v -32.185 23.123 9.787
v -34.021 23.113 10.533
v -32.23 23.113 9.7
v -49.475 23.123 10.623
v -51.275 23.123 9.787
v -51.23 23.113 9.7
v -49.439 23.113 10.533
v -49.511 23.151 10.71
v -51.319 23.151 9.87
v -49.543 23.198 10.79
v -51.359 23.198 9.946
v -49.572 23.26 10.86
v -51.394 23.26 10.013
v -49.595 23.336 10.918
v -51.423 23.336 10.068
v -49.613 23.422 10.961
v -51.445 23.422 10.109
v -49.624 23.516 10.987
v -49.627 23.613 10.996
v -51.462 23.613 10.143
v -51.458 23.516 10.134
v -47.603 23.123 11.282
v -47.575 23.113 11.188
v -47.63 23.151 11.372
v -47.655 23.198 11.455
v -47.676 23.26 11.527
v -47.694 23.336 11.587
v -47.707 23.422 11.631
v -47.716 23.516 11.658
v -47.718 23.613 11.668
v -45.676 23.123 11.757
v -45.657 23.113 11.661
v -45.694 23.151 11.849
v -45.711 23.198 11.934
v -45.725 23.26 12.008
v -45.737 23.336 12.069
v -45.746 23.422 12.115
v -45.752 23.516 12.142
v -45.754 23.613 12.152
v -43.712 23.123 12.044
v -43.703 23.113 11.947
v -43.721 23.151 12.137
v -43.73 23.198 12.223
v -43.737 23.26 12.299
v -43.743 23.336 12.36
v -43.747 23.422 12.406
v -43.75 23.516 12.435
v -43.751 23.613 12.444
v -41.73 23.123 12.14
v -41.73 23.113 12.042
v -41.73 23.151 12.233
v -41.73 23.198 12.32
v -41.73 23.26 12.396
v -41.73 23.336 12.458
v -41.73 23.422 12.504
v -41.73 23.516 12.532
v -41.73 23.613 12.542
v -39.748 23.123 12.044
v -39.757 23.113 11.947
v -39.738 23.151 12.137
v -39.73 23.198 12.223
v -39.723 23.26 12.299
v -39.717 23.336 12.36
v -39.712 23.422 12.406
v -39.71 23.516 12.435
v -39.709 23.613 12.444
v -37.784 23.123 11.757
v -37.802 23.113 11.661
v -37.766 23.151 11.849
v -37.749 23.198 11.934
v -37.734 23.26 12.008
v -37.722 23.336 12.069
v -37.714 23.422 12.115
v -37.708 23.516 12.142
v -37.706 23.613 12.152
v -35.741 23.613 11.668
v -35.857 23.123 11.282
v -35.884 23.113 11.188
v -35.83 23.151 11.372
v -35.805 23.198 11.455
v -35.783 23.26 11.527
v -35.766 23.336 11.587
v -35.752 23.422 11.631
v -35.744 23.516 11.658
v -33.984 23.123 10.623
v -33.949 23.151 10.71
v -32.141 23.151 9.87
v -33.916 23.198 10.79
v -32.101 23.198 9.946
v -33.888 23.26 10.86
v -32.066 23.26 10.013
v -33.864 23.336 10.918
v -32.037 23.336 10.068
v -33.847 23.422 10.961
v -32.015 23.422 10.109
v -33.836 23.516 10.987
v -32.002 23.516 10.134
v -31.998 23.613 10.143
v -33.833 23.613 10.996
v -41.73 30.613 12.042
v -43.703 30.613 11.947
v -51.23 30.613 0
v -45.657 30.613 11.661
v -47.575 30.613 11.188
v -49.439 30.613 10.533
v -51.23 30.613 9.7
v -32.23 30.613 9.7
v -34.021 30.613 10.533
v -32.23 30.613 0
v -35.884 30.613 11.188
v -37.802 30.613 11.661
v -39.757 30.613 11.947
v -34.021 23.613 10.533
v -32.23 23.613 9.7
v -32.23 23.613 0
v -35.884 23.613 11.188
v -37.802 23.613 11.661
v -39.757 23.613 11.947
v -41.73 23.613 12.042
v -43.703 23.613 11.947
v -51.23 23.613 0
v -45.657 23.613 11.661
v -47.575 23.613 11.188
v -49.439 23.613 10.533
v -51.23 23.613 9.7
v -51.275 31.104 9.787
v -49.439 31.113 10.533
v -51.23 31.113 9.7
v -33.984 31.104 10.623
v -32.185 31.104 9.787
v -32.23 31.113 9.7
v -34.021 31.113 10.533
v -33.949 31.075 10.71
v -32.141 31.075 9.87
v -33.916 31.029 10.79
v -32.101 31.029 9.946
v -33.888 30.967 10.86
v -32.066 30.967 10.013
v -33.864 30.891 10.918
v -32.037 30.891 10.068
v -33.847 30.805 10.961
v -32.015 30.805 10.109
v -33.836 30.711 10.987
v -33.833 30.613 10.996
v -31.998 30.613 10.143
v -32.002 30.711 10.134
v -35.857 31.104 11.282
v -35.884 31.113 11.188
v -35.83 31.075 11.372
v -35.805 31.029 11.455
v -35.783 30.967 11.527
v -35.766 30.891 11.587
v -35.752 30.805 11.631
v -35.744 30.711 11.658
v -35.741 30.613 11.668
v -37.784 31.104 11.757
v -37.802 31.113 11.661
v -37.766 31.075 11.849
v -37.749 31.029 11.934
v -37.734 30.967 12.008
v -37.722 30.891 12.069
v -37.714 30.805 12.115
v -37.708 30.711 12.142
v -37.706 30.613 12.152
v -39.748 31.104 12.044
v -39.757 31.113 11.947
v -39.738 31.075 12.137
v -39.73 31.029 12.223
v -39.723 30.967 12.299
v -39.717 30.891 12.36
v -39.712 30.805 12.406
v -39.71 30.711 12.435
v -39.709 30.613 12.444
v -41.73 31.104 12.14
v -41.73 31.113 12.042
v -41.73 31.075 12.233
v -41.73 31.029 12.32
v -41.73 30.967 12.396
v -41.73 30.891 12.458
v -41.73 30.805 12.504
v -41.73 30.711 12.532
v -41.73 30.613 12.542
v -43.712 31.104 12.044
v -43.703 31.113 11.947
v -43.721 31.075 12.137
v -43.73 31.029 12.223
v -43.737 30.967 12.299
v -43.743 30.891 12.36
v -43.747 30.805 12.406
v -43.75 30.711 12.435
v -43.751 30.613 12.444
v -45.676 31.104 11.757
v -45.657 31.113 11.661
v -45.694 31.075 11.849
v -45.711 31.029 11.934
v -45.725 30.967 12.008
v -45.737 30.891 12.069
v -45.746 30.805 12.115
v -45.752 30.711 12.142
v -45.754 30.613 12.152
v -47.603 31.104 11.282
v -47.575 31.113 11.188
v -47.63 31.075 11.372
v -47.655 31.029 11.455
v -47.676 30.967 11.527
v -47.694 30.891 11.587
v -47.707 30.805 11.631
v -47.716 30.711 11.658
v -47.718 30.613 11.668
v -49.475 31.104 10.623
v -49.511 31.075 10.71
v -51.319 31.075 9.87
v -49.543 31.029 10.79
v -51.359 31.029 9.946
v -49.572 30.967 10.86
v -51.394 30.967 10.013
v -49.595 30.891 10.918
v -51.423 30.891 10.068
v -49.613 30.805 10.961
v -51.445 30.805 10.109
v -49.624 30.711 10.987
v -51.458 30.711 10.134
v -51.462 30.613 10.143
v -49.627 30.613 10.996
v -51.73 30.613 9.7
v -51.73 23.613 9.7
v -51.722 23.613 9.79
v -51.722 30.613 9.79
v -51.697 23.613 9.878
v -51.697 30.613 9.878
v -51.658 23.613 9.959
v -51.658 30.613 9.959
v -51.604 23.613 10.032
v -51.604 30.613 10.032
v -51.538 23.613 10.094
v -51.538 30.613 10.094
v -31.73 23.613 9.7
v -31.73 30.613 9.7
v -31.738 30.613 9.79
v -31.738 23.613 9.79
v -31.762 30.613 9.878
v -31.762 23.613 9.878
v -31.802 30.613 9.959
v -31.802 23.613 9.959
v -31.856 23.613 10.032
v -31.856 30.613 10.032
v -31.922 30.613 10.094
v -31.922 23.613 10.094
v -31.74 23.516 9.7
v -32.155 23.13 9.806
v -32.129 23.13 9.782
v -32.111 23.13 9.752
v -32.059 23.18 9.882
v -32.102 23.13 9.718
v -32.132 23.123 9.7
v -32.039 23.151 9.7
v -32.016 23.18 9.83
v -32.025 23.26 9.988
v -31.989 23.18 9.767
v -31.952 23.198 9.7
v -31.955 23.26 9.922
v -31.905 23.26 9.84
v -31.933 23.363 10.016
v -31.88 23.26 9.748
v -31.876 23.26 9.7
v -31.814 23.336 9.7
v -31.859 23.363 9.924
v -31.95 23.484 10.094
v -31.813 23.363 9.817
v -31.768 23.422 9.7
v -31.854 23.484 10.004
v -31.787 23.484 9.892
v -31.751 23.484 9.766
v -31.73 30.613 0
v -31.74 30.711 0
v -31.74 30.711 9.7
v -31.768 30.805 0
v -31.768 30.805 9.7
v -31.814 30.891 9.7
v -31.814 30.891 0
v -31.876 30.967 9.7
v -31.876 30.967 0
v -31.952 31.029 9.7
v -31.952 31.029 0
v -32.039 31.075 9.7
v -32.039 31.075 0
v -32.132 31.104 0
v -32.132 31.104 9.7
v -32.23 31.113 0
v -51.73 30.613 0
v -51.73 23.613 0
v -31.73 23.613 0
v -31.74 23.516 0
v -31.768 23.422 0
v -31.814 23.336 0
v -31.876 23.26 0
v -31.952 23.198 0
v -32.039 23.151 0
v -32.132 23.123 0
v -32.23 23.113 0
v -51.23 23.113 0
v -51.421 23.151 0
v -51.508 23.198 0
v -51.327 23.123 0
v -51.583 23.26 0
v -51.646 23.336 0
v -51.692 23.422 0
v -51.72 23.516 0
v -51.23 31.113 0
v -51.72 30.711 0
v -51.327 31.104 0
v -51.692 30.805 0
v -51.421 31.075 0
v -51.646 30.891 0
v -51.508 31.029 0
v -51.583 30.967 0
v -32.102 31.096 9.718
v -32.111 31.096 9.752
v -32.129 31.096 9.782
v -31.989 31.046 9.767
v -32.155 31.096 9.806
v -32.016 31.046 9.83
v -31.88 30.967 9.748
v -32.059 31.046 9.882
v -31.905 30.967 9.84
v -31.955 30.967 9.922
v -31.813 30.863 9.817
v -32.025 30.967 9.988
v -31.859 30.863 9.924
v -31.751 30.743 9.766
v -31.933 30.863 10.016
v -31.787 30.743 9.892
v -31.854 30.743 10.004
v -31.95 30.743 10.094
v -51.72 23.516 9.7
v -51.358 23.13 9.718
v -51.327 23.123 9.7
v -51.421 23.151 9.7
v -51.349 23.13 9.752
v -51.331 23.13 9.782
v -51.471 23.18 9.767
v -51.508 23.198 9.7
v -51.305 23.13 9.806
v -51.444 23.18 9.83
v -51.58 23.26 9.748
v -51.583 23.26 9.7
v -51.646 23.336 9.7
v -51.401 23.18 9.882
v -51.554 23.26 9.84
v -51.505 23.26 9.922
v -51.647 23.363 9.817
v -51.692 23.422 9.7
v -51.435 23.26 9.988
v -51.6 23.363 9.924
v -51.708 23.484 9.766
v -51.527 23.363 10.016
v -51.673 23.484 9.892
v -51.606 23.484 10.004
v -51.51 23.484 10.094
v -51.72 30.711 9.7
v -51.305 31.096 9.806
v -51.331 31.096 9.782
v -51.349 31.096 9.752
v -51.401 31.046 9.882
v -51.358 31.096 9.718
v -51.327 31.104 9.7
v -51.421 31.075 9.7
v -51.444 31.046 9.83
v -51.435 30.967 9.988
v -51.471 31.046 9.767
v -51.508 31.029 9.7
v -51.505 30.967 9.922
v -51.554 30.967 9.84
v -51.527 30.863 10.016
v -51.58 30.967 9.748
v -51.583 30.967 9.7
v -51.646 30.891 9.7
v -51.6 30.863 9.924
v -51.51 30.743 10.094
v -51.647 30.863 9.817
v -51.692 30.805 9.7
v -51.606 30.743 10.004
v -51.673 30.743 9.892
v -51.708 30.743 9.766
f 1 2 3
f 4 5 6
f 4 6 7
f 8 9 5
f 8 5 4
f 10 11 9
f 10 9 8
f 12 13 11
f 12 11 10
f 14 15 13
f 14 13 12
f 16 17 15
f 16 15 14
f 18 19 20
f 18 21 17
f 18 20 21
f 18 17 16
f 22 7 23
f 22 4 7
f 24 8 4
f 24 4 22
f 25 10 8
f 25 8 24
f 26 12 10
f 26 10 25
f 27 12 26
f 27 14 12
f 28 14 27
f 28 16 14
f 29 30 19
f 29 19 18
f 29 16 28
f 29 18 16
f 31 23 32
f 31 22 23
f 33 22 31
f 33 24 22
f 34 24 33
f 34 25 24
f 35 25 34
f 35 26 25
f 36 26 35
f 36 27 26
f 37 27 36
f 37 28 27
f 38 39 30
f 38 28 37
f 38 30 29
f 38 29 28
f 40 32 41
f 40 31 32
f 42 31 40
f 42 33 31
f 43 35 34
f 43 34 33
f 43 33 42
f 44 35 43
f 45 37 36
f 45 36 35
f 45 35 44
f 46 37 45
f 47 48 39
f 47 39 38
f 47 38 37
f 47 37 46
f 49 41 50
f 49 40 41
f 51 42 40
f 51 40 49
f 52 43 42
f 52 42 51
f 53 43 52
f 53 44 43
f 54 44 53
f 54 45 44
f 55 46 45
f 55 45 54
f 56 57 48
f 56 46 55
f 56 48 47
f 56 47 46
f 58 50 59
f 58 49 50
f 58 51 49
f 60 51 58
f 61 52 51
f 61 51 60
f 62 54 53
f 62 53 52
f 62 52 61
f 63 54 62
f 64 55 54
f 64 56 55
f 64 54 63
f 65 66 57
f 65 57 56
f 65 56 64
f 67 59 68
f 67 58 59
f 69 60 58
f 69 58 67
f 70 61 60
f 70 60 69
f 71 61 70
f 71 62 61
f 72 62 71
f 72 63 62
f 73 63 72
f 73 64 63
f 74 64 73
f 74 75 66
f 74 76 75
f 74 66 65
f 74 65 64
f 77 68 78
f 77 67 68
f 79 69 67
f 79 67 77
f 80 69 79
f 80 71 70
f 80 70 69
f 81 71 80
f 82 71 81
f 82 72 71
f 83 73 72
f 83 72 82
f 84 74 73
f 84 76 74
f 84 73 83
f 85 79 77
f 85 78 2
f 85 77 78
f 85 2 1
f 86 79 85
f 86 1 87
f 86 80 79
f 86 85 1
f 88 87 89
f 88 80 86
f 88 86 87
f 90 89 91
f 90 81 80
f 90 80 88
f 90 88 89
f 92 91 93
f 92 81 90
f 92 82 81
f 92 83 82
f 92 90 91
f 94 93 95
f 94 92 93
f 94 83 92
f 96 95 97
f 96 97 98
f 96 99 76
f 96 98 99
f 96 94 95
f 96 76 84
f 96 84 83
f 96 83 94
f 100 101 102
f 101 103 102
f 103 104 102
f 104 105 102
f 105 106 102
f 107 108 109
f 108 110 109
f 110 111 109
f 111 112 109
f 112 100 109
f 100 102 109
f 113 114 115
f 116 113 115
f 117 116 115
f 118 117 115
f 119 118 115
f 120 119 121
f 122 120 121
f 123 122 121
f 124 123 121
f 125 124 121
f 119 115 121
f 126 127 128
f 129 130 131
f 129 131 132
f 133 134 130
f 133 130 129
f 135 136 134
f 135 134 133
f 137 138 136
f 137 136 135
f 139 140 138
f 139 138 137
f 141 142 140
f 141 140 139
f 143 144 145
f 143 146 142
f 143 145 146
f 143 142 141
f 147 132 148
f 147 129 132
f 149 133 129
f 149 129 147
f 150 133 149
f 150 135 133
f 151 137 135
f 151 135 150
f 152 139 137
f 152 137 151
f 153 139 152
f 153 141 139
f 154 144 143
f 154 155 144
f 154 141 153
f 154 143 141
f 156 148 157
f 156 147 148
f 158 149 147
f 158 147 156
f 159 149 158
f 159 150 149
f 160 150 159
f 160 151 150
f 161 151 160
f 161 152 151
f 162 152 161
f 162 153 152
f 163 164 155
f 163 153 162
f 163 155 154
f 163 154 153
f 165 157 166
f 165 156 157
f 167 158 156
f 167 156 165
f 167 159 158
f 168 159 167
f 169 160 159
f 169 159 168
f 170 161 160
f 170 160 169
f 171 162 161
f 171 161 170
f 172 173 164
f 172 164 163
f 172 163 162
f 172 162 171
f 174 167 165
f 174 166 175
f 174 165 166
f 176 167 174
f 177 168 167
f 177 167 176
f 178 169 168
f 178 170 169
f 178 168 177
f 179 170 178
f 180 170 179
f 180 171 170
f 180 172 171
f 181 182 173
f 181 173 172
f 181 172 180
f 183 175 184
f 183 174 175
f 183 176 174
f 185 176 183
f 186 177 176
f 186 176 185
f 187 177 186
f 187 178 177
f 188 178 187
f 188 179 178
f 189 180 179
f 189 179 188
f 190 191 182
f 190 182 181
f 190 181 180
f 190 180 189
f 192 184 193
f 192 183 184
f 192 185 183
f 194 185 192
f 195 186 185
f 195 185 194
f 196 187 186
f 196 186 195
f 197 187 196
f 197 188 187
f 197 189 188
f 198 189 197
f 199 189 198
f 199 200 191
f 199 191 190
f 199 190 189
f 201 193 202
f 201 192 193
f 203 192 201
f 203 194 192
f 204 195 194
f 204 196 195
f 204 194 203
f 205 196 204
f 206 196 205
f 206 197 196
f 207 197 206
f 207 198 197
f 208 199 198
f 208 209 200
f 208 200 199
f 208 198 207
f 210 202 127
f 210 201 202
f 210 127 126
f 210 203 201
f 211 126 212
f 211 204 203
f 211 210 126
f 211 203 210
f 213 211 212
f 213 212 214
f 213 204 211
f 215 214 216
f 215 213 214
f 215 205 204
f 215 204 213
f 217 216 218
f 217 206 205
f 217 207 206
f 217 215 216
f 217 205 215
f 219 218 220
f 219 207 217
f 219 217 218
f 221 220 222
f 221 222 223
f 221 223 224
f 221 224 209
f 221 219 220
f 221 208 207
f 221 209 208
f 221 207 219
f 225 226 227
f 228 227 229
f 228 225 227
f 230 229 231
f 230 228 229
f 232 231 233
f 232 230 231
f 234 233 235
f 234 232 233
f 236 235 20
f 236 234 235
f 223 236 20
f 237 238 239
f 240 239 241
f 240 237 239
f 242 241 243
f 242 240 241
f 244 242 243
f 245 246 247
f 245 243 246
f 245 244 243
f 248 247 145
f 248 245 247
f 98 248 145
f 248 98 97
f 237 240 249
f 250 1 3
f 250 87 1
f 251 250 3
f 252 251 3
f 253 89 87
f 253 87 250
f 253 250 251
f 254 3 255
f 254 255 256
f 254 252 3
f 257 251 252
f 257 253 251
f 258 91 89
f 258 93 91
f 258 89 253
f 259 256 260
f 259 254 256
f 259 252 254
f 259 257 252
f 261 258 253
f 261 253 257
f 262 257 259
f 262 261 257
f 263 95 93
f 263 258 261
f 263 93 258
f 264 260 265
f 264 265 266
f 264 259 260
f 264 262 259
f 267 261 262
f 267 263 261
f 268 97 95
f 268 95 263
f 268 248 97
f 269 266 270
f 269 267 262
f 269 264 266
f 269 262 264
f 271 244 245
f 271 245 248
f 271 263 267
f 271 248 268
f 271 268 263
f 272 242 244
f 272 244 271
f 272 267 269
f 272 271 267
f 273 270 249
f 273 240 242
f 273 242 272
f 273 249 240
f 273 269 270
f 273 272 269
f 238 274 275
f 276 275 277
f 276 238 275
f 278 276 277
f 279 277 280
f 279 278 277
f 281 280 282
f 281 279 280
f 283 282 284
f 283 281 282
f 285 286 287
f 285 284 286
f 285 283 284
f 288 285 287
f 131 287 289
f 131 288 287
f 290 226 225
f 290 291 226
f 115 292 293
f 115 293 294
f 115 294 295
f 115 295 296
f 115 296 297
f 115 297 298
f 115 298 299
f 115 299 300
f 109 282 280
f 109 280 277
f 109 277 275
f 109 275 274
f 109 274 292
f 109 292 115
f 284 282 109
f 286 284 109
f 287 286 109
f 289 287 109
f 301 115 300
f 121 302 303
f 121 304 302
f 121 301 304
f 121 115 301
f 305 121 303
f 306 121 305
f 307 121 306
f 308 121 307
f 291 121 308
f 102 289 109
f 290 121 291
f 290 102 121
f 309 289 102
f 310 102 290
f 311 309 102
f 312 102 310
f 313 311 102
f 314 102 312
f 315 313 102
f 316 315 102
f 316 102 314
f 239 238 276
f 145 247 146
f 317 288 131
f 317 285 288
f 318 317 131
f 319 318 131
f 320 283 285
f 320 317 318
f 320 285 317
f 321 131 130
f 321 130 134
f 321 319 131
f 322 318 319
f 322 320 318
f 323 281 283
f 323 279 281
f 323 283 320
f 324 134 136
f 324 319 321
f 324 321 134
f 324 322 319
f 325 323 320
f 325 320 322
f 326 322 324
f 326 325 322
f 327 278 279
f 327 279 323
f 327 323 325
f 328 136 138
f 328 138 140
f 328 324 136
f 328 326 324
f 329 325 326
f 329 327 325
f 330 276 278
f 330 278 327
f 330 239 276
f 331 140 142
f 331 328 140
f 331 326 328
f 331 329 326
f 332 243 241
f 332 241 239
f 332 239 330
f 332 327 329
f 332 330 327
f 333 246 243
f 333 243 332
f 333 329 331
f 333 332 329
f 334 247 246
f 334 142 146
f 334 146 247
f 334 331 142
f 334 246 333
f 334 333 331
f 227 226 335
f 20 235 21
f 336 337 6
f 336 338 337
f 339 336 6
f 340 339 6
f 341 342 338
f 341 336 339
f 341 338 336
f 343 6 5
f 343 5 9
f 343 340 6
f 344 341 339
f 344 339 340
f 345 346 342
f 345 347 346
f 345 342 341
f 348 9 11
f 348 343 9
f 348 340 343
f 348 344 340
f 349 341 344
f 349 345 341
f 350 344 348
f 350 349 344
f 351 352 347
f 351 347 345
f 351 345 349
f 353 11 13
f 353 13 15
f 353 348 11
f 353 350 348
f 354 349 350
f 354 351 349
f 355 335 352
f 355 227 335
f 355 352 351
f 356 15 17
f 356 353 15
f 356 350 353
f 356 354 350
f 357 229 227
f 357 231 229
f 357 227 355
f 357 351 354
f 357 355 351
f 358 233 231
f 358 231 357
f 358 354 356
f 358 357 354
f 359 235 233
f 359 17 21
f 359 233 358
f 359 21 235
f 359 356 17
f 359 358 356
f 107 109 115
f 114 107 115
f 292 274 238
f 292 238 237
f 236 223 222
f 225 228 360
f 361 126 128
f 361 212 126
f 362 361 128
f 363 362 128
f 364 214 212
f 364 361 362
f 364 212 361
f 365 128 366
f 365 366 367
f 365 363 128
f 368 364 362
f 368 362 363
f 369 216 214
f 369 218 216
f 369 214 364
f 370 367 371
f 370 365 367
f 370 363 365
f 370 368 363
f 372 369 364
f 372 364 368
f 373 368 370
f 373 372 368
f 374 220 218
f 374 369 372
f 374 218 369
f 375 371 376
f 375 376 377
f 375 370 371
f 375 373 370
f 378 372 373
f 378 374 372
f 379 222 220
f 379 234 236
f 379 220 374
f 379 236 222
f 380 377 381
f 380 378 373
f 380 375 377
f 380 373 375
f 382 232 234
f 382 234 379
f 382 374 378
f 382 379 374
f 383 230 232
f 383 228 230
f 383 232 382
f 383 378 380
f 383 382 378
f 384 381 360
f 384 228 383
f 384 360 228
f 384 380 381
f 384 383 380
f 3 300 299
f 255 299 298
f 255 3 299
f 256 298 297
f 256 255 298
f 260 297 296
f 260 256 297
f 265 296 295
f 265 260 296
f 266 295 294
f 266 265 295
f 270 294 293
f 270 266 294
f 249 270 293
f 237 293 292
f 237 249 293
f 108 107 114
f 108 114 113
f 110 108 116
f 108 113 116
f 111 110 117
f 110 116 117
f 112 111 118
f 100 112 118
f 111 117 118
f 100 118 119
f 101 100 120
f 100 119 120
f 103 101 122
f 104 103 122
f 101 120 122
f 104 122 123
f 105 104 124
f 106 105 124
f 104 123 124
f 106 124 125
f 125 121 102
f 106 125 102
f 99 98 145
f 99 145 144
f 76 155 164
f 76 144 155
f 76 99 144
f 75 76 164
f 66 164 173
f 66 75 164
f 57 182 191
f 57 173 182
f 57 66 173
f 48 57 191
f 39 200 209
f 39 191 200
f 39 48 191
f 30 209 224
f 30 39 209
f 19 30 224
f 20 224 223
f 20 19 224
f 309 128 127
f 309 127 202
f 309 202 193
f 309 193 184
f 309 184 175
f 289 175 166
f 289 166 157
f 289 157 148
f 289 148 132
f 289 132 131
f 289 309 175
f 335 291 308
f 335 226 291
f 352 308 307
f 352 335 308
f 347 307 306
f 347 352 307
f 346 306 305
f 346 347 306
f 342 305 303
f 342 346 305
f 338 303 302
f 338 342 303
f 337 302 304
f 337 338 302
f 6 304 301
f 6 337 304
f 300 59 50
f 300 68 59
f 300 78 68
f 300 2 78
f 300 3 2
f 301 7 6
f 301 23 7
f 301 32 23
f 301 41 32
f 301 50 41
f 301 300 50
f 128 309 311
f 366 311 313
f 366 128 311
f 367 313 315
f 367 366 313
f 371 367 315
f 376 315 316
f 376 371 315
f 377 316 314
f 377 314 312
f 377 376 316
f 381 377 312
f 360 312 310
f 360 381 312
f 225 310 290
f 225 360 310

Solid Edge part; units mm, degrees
sketch "Sketch1" plane through (0, 0, 0) normal (0, 0, 1) x (1, 0, 0)
  line L0 (-51.7299, 31.1134) -> (-31.7299, 31.1134)
  line L1 (-31.7299, 31.1134) -> (-31.7299, 23.1134)
  line L2 (-31.7299, 23.1134) -> (-51.7299, 23.1134)
  line L3 (-51.7299, 23.1134) -> (-51.7299, 31.1134)
extrude "Protrusion1" add sketch "Sketch1" along normal blind 10
sketch "Sketch2" plane through (-41.7299, 23.1134, 5) normal (0, -1, 0) x (1, 0, 0)
  arc A0 (-10, 5) -> (10, 5) centre (0, -13.3979) cw
extrude "Protrusion2" add sketch "Sketch2" against normal up to vertex (8 mm away) material side at (-41.7299, 23.1134, 12.4921)
shell "Thinwall_1" thickness 0.5 removed faces 1 at (-34.8632, 24.5267, 0)
fillet "Round_1" radius 0.5 8 edges at (-41.7299, 23.1134, 12.5421) (-51.7299, 27.1134, 10) (-51.7299, 23.1134, 5) (-41.7299, 31.1134, 12.5421) (-51.7299, 31.1134, 5) (-31.7299, 31.1134, 5) (-31.7299, 27.1134, 10) (-31.7299, 23.1134, 5)
properties part number "598-205" material "N\\A"
